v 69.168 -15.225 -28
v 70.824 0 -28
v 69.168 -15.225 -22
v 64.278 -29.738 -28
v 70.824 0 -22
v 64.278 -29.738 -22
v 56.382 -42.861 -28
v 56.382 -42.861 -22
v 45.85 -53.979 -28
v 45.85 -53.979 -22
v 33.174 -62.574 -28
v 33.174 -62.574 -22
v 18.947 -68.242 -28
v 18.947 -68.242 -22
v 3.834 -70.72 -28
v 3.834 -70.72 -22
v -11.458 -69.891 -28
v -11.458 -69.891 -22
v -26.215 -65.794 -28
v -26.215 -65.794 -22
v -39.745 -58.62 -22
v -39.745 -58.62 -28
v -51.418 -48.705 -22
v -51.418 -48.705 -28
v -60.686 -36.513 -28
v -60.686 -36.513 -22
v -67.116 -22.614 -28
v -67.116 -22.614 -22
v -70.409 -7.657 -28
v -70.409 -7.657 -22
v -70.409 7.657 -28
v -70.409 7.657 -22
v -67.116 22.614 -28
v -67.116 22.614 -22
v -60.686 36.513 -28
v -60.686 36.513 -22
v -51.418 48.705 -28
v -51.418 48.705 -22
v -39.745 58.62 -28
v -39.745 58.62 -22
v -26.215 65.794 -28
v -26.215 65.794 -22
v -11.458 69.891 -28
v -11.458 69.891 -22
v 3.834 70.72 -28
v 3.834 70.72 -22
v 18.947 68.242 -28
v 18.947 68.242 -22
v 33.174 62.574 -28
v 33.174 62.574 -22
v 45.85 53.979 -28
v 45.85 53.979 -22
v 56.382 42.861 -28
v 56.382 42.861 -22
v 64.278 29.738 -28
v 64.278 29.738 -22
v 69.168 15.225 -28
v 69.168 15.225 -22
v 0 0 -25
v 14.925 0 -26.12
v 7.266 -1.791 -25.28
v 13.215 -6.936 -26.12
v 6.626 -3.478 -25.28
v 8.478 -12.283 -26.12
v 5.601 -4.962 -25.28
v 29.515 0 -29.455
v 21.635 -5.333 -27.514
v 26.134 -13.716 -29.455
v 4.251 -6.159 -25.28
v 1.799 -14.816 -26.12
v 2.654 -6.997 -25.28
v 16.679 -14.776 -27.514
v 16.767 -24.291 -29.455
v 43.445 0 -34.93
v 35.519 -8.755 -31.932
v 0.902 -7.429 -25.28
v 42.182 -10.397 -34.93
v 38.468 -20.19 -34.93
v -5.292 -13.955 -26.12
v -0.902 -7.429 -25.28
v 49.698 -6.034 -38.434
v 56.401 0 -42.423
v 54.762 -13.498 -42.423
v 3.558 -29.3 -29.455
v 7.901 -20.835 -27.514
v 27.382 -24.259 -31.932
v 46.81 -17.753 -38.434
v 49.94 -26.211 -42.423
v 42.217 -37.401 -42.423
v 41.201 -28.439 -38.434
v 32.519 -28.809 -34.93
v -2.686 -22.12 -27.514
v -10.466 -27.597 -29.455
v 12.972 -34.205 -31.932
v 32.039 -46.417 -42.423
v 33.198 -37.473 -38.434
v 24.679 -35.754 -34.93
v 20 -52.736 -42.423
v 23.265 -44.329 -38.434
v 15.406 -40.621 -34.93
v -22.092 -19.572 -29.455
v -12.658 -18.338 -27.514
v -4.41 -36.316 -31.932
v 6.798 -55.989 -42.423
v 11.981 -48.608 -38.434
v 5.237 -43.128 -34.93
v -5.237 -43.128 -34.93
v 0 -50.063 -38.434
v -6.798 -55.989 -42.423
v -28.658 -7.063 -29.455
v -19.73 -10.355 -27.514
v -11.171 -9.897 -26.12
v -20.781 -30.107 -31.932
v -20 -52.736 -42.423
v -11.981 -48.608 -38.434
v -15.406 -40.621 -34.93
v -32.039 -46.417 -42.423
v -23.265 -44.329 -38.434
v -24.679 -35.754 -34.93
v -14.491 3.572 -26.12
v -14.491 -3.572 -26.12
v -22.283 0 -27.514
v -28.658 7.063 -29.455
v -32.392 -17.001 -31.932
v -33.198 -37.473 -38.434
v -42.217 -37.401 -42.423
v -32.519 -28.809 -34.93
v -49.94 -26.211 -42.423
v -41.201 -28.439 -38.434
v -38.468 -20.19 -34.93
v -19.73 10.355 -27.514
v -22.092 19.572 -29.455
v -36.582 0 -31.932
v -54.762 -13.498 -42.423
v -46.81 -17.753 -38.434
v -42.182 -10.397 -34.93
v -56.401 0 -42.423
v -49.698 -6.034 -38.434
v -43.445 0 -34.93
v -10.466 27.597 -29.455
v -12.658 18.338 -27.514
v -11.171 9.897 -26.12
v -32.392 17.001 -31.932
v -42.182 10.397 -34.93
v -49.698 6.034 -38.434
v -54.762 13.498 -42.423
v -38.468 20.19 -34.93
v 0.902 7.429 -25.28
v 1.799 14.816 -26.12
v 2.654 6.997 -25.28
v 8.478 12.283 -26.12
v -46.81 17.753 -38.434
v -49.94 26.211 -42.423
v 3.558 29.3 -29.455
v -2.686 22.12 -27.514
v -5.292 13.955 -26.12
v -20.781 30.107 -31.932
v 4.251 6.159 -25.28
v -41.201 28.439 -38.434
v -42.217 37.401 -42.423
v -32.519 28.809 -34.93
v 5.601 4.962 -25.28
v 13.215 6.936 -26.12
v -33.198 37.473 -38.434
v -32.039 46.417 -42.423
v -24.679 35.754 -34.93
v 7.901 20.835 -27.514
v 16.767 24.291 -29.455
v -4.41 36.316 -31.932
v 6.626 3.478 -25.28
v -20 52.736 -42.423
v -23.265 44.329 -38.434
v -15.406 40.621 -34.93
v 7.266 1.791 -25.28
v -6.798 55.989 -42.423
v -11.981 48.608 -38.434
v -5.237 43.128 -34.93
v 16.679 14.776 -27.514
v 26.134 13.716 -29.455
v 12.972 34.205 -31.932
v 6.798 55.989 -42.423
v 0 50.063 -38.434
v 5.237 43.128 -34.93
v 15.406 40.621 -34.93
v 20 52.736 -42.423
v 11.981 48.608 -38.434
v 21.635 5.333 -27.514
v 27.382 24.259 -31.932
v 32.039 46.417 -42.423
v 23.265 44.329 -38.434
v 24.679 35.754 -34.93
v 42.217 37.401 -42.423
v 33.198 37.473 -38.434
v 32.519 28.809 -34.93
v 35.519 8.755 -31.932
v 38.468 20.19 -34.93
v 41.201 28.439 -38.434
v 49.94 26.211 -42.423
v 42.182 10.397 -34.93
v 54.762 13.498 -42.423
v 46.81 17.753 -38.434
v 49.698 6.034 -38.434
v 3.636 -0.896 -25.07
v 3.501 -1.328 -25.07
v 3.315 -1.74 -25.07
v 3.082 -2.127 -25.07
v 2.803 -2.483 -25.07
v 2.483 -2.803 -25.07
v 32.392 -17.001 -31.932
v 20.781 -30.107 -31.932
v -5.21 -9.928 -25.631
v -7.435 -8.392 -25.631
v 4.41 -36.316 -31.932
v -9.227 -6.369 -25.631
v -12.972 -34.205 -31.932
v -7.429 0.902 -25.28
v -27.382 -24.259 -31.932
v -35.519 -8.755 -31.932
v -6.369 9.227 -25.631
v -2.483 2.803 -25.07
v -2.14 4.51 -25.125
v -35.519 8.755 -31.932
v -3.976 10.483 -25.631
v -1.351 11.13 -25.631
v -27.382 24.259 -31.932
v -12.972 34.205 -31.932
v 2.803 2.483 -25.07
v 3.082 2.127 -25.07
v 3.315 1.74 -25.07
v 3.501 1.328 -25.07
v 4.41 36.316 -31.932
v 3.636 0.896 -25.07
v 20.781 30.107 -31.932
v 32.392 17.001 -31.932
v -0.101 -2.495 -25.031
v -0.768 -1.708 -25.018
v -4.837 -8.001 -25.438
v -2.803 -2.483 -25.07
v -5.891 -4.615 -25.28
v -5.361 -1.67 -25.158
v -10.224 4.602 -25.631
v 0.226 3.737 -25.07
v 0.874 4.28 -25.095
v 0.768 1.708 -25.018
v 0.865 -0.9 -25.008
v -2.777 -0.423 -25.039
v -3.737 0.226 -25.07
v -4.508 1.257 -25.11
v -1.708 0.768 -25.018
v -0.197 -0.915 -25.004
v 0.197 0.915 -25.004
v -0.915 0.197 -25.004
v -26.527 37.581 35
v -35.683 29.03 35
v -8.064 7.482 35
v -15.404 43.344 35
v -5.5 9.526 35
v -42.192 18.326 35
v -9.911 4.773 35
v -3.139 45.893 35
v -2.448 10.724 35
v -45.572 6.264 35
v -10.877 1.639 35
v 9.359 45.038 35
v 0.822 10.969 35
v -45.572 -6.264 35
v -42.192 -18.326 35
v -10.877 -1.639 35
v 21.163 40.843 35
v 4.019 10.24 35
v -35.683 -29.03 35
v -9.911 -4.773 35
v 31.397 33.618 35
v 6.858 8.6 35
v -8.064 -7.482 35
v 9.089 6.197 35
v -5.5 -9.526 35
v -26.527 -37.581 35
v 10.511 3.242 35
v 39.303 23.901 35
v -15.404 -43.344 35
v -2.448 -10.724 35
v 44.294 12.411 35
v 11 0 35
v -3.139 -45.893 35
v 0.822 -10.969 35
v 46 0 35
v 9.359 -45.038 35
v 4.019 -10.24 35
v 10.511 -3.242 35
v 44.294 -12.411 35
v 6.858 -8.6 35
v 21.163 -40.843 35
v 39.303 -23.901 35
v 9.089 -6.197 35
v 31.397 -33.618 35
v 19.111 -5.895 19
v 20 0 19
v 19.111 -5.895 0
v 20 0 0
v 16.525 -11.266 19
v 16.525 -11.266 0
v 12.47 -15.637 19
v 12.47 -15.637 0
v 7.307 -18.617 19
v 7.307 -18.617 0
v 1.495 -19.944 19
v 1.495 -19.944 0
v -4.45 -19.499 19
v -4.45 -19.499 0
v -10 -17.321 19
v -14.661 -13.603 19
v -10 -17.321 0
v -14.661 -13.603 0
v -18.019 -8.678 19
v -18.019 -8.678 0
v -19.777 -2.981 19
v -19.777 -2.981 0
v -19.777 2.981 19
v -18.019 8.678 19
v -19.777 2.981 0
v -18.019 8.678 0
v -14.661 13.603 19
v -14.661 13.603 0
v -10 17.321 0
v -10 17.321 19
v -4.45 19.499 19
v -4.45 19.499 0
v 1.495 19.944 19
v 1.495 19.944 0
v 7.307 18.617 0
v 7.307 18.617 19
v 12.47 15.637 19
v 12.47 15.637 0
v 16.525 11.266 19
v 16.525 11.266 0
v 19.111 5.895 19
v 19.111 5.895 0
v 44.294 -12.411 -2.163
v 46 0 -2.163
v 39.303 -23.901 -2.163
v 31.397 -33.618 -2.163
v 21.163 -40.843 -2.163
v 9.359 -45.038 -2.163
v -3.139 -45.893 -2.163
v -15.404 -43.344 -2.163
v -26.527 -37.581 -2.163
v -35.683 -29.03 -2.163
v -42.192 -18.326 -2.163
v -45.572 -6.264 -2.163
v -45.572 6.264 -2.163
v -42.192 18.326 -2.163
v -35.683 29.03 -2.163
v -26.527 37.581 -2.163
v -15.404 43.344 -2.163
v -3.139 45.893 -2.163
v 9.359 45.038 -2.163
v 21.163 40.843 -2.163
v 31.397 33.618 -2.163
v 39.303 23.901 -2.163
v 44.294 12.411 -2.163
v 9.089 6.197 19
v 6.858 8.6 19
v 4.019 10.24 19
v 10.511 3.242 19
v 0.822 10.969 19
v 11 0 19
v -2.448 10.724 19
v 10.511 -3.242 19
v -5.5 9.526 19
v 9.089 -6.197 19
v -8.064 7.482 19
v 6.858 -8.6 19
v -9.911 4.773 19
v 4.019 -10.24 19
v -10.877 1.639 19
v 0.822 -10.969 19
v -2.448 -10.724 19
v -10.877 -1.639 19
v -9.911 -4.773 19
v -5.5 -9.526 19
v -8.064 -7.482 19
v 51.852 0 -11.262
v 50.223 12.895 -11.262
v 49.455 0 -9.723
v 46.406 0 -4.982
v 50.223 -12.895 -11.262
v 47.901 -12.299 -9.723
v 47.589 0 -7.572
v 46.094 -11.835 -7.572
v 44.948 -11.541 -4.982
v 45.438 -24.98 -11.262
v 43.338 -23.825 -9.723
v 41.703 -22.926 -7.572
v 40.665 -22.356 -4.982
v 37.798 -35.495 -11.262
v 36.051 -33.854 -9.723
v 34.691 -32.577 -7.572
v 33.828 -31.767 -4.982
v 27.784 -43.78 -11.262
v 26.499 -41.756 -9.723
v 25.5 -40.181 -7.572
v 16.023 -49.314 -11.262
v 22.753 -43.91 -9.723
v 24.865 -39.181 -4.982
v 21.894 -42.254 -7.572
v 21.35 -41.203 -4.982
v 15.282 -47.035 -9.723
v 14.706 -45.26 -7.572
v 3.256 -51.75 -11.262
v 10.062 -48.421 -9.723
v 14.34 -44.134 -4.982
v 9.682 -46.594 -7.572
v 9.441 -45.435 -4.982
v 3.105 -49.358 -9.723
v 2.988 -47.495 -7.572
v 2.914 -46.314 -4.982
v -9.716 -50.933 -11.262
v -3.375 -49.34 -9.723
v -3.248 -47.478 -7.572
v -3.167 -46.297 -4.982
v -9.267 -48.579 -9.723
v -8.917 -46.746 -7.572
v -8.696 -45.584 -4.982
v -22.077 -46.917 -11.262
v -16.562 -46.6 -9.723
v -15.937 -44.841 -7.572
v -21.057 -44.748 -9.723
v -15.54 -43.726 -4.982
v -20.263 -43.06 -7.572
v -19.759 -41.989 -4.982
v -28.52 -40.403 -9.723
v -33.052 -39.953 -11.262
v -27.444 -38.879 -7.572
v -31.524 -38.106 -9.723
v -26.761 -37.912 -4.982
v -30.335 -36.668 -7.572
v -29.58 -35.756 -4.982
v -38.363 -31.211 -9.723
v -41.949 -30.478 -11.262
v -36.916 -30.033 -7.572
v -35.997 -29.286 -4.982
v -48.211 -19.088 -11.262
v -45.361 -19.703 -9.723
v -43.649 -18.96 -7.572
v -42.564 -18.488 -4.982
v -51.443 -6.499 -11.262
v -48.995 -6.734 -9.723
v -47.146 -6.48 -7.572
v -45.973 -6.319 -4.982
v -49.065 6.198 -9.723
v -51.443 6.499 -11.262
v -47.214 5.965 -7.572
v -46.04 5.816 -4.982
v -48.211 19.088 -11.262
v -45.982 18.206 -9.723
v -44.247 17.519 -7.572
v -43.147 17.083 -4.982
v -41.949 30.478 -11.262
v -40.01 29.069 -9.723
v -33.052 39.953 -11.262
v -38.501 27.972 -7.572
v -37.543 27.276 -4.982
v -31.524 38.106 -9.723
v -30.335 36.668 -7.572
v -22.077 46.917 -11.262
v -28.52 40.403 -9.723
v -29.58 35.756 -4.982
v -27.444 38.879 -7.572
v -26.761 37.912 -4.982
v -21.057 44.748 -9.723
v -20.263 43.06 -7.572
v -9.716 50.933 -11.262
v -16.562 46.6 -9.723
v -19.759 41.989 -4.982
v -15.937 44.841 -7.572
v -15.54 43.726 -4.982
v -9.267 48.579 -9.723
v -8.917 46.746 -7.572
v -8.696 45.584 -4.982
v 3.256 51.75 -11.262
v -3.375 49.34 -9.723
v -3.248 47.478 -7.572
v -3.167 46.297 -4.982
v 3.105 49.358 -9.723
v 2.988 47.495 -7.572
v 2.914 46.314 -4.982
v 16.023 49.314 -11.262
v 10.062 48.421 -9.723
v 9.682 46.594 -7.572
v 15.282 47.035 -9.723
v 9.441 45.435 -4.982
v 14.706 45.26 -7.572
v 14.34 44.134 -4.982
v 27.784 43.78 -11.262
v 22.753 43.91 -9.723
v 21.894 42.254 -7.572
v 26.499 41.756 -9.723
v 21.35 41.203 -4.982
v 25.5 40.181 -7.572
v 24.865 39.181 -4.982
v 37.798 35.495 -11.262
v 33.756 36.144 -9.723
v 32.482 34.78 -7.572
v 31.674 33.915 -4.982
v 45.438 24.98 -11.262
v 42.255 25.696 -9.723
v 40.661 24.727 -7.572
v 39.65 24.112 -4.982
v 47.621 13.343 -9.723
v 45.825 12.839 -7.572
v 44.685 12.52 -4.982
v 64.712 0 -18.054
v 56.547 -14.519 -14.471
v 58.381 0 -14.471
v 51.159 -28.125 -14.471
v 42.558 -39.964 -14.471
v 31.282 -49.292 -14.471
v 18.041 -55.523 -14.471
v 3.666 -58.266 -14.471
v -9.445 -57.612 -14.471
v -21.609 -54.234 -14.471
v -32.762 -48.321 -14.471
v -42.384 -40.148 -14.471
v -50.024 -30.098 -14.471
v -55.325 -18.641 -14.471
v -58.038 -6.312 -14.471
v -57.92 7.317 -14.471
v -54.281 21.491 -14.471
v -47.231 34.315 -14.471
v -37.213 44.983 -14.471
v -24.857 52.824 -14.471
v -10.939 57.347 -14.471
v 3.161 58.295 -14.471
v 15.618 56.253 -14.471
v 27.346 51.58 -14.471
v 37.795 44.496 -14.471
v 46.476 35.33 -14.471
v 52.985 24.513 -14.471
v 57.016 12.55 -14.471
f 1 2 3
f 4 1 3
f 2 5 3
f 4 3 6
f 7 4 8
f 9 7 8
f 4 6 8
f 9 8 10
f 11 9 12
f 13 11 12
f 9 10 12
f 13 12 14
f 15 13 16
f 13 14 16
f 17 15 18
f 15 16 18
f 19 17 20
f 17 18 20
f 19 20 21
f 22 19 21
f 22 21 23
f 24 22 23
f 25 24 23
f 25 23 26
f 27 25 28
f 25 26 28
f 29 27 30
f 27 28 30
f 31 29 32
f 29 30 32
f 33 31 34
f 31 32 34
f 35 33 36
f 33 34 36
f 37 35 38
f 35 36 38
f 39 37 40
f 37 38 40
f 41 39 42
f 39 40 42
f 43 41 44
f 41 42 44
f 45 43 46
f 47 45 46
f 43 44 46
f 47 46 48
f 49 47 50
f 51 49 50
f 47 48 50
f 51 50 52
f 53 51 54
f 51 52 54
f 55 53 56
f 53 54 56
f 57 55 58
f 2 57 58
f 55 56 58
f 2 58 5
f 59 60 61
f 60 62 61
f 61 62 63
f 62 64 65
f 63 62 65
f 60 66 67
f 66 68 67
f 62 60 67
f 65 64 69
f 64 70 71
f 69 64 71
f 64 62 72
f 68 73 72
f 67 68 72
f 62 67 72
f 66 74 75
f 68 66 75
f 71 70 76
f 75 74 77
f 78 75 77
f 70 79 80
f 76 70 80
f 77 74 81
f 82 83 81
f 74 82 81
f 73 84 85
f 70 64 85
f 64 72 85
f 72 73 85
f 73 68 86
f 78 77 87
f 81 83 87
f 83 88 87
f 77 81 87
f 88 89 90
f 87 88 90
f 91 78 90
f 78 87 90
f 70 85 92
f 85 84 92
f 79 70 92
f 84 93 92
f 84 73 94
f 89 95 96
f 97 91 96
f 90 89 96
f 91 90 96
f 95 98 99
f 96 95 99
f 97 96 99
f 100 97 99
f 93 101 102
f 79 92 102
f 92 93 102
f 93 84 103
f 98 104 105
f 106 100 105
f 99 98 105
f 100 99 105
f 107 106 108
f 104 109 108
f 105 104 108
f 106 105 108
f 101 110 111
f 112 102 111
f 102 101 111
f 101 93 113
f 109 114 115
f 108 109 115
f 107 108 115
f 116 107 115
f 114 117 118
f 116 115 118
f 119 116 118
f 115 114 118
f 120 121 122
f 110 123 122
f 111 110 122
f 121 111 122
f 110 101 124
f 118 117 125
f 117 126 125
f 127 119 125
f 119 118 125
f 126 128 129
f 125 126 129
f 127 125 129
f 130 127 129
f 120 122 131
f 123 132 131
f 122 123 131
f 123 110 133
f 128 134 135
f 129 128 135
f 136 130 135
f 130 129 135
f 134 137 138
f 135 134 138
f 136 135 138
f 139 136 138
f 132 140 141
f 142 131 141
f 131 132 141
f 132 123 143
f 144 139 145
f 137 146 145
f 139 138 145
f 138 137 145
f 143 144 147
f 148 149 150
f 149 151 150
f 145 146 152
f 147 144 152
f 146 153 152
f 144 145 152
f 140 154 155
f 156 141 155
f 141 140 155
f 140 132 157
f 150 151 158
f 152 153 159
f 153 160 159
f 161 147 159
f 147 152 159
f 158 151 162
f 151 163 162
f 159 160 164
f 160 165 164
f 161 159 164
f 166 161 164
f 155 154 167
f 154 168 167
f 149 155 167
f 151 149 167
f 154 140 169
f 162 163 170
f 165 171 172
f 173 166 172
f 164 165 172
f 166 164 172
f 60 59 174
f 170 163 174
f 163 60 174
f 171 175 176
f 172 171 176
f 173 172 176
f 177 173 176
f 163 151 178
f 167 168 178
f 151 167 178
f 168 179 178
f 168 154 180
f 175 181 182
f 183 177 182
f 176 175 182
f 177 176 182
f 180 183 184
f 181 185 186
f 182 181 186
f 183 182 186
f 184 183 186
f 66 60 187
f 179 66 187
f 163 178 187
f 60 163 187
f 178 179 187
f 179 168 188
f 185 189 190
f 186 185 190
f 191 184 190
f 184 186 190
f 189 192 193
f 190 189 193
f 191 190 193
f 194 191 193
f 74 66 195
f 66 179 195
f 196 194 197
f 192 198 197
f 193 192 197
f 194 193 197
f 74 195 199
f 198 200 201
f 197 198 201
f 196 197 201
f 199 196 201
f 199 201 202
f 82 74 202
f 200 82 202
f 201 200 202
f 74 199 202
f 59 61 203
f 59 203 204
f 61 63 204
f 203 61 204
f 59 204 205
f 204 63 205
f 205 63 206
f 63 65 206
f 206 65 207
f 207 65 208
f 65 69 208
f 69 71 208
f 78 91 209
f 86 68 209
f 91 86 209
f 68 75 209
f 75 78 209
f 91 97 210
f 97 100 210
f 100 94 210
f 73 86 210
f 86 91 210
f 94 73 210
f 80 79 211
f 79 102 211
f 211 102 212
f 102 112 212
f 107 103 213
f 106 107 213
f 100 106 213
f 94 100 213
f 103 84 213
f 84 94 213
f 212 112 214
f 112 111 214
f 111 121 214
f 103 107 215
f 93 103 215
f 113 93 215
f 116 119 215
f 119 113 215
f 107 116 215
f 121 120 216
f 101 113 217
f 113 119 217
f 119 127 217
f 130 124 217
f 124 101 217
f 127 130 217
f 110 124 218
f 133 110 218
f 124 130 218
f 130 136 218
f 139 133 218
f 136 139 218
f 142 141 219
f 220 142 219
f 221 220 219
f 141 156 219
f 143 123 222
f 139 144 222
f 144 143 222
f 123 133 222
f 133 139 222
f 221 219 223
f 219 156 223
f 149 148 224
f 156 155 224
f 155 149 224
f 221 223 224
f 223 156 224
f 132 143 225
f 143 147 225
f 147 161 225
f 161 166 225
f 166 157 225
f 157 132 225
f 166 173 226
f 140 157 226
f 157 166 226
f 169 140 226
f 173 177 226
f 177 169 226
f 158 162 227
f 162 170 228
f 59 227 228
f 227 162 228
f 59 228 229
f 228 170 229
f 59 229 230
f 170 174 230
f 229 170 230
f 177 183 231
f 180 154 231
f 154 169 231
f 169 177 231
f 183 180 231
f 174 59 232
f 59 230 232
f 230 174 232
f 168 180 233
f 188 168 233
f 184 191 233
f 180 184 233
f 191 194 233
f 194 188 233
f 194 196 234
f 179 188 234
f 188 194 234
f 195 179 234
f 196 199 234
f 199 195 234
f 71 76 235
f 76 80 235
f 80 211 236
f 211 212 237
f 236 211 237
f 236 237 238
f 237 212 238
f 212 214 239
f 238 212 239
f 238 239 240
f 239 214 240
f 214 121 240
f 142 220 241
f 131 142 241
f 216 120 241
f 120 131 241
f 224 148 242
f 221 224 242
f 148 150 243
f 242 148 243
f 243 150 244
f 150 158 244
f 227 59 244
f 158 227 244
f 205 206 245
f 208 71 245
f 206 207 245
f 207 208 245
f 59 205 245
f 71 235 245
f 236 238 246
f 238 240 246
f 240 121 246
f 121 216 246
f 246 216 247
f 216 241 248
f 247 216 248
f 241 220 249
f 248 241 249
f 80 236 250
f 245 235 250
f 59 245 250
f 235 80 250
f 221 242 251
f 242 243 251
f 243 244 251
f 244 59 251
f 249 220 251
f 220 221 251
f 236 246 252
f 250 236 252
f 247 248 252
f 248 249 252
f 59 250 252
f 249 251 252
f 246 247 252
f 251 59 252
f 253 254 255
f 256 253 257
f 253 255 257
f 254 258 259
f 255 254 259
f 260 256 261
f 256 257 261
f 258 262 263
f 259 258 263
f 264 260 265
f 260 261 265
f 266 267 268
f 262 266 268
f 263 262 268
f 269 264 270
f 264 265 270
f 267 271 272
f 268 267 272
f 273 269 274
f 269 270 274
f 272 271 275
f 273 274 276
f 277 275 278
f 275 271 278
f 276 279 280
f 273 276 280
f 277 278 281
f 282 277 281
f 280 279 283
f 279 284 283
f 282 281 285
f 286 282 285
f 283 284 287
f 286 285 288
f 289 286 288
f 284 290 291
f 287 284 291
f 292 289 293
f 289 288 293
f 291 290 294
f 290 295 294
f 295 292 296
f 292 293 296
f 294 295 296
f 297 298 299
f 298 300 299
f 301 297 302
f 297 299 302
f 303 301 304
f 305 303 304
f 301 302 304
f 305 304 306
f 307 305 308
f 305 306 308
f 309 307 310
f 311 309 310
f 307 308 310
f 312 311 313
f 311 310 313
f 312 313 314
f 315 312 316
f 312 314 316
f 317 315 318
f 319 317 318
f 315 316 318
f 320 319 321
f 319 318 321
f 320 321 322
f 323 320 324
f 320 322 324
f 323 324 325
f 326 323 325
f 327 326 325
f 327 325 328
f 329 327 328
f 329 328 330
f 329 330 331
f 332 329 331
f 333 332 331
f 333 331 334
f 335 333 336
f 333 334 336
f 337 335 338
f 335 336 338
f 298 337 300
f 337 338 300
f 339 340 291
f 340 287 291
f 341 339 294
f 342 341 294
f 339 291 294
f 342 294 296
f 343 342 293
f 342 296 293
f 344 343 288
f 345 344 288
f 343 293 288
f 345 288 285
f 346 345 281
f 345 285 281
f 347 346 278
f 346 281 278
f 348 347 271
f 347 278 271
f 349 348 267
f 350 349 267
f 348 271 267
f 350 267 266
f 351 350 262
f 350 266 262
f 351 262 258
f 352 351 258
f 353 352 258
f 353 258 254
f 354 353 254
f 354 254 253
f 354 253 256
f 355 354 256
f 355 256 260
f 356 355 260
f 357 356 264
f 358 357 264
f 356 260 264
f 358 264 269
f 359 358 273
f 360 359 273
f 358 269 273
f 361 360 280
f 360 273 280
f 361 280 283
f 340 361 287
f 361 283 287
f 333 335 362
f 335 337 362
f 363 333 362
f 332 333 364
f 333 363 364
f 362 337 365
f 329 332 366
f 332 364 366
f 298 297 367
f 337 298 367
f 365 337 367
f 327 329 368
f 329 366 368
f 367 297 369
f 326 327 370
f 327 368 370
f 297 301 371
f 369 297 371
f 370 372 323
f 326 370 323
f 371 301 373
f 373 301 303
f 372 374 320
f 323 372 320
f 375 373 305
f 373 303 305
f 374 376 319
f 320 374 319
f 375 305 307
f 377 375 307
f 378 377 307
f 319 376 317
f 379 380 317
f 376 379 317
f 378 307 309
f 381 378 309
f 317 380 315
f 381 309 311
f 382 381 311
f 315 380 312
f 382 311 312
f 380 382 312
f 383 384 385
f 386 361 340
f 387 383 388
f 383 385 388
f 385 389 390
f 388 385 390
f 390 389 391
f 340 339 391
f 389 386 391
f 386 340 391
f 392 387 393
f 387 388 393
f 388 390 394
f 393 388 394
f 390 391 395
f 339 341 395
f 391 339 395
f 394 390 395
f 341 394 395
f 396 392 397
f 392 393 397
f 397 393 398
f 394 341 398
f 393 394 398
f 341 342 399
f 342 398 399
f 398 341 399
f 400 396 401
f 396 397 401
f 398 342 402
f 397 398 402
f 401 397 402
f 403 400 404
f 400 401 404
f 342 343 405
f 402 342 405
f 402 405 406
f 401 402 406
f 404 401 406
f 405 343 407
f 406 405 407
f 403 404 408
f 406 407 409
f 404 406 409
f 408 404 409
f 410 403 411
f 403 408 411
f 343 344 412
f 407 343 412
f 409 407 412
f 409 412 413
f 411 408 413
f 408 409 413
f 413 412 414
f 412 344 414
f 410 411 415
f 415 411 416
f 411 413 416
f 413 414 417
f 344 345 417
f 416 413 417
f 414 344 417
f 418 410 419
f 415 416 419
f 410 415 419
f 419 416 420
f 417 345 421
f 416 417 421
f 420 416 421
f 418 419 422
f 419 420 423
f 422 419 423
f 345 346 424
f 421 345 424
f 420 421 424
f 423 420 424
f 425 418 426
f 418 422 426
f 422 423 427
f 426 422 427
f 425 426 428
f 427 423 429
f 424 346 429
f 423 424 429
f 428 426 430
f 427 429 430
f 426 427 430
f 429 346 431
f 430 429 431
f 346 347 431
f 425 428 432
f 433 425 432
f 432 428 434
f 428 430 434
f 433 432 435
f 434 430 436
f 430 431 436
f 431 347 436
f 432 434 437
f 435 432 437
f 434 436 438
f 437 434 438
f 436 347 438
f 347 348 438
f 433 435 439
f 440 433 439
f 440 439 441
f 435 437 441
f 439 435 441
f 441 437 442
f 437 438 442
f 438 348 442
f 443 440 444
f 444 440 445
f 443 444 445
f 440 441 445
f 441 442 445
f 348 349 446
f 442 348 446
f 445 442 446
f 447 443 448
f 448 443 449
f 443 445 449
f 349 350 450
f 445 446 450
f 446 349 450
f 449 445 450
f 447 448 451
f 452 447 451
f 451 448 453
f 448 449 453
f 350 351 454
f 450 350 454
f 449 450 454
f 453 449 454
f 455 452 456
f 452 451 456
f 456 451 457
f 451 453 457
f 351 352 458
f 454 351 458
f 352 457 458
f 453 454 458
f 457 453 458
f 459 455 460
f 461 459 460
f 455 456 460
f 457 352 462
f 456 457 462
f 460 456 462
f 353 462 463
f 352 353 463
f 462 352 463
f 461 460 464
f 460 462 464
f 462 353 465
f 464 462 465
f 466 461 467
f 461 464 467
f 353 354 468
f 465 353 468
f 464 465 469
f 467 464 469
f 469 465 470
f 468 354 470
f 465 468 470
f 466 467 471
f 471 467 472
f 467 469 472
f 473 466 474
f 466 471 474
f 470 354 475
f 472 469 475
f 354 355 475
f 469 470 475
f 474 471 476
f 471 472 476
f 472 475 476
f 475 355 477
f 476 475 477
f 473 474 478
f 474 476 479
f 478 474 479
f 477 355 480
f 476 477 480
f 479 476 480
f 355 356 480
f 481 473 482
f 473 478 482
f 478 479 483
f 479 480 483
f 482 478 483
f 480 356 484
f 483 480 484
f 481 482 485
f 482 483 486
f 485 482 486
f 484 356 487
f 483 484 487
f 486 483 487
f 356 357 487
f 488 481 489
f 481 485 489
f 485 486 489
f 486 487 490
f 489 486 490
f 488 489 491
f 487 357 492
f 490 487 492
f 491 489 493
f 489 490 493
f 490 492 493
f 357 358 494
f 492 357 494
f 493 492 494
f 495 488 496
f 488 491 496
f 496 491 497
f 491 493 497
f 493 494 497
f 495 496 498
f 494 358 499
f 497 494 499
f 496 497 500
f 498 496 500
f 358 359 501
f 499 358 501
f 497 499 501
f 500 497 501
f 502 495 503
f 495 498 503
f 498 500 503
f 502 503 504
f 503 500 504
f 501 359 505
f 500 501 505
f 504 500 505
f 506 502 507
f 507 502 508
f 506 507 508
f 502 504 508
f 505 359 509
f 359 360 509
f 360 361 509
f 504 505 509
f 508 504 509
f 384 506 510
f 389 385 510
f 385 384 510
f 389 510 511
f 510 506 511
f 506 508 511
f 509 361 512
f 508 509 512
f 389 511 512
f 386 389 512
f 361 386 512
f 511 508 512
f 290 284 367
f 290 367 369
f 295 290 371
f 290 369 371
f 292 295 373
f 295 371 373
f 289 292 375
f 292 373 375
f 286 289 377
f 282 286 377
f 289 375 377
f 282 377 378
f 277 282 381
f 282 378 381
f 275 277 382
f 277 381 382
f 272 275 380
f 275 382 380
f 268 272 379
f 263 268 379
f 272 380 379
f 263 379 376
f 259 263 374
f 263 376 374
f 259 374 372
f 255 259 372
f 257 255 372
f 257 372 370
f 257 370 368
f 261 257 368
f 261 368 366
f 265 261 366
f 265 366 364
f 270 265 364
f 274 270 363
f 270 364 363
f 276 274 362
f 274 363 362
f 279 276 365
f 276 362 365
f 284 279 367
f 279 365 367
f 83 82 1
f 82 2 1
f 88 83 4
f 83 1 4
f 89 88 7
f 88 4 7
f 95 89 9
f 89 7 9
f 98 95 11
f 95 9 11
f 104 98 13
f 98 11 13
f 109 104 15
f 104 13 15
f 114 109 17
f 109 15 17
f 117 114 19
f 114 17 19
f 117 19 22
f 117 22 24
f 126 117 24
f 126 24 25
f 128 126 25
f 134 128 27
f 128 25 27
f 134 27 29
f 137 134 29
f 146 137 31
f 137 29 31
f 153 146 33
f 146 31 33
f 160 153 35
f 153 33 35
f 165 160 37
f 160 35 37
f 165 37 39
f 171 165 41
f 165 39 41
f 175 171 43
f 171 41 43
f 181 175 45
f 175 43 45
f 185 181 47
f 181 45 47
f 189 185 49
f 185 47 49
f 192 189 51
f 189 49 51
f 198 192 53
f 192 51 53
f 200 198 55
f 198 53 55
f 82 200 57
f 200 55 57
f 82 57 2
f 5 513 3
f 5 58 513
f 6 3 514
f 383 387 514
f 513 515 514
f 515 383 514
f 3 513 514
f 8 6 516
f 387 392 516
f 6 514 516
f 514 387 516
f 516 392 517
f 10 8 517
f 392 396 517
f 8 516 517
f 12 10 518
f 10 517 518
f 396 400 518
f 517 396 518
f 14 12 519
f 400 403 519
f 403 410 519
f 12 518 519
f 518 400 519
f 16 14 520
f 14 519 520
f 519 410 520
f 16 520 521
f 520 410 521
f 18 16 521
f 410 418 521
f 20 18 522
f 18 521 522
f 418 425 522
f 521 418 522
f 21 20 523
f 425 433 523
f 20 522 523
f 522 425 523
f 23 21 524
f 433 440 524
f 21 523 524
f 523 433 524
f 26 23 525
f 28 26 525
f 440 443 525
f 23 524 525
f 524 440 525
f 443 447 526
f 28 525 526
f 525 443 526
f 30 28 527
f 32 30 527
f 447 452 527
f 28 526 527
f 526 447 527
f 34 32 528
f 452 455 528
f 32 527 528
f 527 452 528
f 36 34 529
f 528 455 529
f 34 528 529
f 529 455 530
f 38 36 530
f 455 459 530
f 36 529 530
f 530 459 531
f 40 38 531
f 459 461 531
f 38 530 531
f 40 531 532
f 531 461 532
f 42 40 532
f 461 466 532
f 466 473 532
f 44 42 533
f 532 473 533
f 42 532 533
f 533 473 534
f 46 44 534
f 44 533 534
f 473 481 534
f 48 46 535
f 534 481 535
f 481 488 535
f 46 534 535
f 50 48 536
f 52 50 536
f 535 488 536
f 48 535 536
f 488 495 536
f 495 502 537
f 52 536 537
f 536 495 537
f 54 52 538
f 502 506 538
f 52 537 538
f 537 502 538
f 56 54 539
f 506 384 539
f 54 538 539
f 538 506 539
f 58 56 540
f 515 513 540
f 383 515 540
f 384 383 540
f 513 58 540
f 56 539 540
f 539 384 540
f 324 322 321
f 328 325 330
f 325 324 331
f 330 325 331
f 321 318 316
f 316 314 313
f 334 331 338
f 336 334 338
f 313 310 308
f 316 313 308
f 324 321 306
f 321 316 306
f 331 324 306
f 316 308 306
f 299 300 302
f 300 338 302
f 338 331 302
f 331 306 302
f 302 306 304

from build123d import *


with BuildPart() as f1:
    # F0 (on Front) → F1 (revolve)
    with BuildSketch(Plane.XZ):
        with BuildLine():
            Line((46, 35), (11, 35))
            Line((11, 35), (11, 19))
            Line((11, 19), (20, 19))
            Line((20, 19), (20, 0))
            Line((20, 0), (0, 0))
            Line((0, 0), (0, -25))
            ThreePointArc((0, -25), (29.515258, -29.454987), (56.400715, -42.42301))
            Line((56.400715, -42.42301), (70.823725, -28))
            Line((70.823725, -28), (70.823725, -22))
            ThreePointArc((70.823725, -22), (61.572329, -16.216507), (51.851852, -11.261768))
            ThreePointArc((51.851852, -11.261768), (47.589249, -7.571892), (46, -2.162709))
            Line((46, -2.162709), (46, 35))
        make_face()
    revolve(axis=Axis((0, 0, 17.5), (0, 0, -1)))


solid = f1.part
